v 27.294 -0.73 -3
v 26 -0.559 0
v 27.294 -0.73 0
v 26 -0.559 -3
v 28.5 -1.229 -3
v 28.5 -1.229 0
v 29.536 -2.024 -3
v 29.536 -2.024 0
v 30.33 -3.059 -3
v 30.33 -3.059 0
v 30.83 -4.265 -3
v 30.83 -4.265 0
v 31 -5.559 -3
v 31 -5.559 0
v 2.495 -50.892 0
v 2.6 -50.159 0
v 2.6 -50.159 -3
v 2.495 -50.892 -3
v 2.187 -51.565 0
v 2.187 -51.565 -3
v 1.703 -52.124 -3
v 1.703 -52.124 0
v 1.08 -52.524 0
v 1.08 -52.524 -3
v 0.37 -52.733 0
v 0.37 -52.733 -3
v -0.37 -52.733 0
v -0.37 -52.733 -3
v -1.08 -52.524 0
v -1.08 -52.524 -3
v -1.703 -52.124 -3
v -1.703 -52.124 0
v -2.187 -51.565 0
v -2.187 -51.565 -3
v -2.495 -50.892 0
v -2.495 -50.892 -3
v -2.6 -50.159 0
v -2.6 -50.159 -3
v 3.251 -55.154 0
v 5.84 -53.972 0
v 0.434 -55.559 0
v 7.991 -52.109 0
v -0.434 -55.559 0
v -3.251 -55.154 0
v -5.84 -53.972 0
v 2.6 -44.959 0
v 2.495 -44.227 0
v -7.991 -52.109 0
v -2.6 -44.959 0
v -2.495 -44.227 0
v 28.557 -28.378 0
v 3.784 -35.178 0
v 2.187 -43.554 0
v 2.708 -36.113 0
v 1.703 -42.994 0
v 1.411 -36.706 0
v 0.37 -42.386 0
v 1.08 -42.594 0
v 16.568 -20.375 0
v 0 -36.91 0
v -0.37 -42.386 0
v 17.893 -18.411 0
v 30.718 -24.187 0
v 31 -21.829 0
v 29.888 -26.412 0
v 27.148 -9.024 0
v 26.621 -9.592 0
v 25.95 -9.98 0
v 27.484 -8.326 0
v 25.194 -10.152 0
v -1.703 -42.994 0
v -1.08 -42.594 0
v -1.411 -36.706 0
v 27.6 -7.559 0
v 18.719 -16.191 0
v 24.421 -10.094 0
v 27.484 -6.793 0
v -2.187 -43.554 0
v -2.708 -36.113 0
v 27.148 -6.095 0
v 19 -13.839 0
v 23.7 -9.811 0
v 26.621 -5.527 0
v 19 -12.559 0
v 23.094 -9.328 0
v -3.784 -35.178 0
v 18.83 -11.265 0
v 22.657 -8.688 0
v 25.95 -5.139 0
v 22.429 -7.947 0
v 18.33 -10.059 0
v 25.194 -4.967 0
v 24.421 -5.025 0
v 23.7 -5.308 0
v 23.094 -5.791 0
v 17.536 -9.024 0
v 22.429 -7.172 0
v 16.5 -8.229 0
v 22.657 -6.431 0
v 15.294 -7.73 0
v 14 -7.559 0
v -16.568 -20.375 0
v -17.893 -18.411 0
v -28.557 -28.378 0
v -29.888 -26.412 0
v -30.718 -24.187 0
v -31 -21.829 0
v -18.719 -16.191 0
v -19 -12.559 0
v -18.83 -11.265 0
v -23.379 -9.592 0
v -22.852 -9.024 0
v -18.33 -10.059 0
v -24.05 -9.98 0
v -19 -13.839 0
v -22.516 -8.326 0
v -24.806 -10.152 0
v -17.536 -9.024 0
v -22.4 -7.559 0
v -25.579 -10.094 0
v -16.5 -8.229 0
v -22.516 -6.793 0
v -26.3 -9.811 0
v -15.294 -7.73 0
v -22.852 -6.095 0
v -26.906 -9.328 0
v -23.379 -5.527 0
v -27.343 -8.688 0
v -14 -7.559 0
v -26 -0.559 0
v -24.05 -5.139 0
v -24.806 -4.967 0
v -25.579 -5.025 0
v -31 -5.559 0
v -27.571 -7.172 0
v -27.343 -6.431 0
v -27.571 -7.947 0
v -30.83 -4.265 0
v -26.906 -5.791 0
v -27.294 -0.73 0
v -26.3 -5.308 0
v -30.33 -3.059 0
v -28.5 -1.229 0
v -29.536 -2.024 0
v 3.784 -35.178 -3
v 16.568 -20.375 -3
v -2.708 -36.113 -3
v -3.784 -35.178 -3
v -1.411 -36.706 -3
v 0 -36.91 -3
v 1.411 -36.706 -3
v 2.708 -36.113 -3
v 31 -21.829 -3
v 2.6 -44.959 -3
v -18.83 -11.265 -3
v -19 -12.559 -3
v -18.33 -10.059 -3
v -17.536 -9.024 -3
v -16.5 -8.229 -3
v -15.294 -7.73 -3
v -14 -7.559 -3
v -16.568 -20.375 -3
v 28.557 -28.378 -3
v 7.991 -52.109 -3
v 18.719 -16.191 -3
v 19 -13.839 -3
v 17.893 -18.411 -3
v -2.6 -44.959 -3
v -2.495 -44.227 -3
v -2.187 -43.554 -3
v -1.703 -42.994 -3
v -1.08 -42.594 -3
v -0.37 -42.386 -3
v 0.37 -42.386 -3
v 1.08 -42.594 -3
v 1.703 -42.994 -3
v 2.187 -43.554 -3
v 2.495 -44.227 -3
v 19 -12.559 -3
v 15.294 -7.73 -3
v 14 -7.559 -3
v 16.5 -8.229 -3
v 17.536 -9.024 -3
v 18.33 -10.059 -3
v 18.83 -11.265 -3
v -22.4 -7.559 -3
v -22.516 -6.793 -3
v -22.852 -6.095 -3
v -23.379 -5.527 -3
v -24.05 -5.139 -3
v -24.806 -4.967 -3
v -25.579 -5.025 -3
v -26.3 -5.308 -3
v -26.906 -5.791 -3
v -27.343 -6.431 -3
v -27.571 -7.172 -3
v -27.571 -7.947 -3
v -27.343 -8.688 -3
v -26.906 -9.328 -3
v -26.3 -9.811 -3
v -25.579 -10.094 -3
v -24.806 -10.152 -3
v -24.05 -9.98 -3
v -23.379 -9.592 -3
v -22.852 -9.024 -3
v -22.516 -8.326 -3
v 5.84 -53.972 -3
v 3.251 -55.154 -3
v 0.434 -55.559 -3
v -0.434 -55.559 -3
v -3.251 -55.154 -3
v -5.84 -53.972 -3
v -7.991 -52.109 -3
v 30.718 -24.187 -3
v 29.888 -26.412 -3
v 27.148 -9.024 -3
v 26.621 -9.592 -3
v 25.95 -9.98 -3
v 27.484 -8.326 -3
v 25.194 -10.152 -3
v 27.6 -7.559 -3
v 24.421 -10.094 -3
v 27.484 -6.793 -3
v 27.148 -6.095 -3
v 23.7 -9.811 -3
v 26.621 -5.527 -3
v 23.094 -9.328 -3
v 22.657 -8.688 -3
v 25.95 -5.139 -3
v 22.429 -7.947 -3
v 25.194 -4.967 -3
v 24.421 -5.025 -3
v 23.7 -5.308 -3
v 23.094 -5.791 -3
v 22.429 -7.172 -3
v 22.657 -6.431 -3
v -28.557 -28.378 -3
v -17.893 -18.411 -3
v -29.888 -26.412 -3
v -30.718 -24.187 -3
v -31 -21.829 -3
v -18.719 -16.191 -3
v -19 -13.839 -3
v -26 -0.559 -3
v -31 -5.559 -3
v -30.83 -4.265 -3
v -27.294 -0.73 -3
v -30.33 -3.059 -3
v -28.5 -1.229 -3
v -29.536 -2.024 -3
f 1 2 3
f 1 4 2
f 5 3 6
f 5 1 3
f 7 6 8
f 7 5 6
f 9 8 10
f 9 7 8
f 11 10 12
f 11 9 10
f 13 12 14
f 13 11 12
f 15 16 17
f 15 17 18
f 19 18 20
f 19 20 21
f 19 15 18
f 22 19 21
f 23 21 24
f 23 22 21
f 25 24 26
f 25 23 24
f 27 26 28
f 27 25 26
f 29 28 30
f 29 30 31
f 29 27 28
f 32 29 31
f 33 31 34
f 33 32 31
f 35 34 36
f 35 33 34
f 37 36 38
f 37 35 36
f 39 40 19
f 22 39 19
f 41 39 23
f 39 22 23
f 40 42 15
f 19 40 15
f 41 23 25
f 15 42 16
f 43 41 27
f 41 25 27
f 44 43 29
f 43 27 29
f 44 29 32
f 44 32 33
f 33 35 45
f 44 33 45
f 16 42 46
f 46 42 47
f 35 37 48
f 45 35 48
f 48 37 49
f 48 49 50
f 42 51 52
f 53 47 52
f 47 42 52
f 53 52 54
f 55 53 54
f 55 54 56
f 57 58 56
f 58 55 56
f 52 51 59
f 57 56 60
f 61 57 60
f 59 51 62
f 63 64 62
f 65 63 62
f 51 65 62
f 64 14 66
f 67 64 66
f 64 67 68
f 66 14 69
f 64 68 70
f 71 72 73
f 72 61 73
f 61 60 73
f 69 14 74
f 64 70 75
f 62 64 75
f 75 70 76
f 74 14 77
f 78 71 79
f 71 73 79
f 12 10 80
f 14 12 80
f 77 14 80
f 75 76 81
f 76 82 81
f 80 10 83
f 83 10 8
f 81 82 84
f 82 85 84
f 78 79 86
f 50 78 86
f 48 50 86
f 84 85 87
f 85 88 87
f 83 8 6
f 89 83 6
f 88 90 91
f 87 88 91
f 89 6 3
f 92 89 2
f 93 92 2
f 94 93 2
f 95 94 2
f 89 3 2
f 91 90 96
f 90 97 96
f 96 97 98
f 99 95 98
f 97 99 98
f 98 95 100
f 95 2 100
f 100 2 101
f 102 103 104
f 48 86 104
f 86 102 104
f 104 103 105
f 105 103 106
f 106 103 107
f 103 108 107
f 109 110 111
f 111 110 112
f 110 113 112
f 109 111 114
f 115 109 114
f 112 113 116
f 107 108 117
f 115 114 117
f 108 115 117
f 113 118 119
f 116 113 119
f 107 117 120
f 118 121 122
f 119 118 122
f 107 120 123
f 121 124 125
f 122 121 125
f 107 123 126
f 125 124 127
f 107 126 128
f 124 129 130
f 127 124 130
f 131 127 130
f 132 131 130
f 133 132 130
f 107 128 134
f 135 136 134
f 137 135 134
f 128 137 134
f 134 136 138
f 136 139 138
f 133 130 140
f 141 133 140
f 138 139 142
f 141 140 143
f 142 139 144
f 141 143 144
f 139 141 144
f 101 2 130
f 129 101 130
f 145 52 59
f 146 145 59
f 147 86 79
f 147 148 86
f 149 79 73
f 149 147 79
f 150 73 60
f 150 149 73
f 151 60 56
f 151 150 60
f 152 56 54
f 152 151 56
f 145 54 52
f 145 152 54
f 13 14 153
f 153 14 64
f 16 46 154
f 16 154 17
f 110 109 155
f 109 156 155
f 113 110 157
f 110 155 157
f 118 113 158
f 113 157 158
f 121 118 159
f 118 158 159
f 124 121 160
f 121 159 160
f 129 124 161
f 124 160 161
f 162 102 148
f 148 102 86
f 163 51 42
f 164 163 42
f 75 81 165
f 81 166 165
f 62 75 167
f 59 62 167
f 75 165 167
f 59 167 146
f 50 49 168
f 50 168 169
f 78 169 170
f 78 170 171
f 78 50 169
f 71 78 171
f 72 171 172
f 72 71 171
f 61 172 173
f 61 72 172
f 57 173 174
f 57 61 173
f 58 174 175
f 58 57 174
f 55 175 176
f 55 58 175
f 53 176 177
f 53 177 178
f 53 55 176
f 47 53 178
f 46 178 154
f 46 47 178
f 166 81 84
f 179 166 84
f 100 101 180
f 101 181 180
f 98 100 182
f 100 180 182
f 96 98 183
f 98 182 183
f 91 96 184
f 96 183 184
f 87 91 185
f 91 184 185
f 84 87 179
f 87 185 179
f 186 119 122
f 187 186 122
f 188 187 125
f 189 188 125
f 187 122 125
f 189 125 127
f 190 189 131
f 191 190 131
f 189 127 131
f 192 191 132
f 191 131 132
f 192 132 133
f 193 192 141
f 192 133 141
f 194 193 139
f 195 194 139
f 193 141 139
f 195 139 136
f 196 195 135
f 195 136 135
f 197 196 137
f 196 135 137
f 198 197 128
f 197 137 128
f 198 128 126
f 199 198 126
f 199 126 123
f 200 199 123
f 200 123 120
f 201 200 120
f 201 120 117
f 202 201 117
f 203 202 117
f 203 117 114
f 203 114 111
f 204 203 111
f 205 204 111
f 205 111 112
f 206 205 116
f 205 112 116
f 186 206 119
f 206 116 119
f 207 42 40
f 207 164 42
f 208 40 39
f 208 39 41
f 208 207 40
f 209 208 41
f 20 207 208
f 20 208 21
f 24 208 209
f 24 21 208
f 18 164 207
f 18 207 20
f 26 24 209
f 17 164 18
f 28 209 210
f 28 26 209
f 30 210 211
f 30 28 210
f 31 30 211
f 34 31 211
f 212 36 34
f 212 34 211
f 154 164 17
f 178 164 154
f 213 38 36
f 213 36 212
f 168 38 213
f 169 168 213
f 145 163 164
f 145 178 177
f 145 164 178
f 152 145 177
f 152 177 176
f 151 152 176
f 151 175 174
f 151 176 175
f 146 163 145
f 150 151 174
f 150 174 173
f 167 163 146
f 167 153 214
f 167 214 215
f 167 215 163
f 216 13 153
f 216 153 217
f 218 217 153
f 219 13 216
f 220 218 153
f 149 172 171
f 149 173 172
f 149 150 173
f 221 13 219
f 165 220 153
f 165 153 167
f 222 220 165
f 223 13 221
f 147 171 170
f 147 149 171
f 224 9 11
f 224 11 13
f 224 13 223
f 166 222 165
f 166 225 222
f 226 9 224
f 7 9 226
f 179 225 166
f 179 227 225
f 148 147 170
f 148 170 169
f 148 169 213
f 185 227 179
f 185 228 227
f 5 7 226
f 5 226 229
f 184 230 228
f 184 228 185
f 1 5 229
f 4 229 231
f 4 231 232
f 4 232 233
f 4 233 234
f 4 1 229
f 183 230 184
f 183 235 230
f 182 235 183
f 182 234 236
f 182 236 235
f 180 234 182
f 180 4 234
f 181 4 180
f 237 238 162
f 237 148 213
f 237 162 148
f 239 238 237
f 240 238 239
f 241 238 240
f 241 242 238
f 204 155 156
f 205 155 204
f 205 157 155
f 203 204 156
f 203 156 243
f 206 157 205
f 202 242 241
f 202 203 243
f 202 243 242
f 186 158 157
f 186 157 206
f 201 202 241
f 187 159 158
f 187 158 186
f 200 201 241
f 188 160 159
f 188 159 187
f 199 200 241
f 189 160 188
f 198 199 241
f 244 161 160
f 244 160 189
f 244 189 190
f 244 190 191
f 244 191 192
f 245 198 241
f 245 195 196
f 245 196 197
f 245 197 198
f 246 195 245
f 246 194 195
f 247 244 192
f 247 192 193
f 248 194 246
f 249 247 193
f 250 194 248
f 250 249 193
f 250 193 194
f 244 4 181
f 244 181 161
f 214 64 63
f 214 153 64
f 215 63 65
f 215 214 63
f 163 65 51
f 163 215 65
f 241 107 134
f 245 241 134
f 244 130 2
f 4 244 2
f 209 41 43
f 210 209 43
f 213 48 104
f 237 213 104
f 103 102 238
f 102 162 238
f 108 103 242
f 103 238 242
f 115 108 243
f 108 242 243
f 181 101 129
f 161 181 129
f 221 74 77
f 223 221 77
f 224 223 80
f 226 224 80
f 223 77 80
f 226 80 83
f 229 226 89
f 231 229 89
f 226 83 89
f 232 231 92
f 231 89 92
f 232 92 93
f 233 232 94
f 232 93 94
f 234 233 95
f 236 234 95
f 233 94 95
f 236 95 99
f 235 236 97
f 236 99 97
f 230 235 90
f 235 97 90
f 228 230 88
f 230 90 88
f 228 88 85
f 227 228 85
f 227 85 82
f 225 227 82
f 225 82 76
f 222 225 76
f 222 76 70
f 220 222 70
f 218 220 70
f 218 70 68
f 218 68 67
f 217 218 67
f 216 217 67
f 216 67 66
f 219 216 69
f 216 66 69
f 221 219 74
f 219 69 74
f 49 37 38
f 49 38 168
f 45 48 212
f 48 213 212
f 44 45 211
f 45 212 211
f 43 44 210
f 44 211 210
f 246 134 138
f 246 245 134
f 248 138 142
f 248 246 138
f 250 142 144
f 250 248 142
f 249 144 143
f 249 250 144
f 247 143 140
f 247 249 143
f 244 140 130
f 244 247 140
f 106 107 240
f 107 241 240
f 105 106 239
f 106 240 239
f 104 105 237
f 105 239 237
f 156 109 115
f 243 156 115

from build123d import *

# Parameters (mm, degrees)
SKETCH1_R          = 2.6
BASE_FLANGE1_DEPTH = 3
FILLET_10_MM_R     = 10
FILLET_5_MM_R      = 5


# Sheet-metal steps are written as plain solids
with BuildPart() as part:
    # Sketch1 → Base-Flange1 (new body)
    with BuildSketch(Plane.XY):
        Polygon((-31, -0.559405941), (31, -0.559405941), (31, -25.559405941), (5, -55.559405941), (-5, -55.559405941), (-31, -25.559405941), align=None)
        with Locations((25, -7.559405941)):
            Circle(SKETCH1_R, mode=Mode.SUBTRACT)
        with Locations((-25, -7.559405941)):
            Circle(SKETCH1_R, mode=Mode.SUBTRACT)
        with BuildLine():
            Line((-2.6, -50.159405941), (-2.6, -44.959405941))
            ThreePointArc((-2.6, -44.959405941), (0, -42.359405941), (2.6, -44.959405941))
            Line((2.6, -44.959405941), (2.6, -50.159405941))
            ThreePointArc((2.6, -50.159405941), (0, -52.759405941), (-2.6, -50.159405941))
        make_face(mode=Mode.SUBTRACT)
        Polygon((0, -39.559405941), (19, -17.559405941), (19, -7.559405941), (-19, -7.559405941), (-19, -17.559405941), align=None, mode=Mode.SUBTRACT)
    extrude(amount=-BASE_FLANGE1_DEPTH)

    # fillet 10 mm
    fillet_10_mm_edges = [part.edges().sort_by_distance(p)[0] for p in [
        (31, -25.559405941, -1.5),
        (5, -55.559405941, -1.5),
        (-5, -55.559405941, -1.5),
        (-31, -25.559405941, -1.5),
        (-19, -17.559405941, -1.5),
        (19, -17.559405941, -1.5),
    ]]
    fillet(fillet_10_mm_edges, radius=FILLET_10_MM_R)

    # fillet 5 mm
    fillet_5_mm_edges = [part.edges().sort_by_distance(p)[0] for p in [
        (-31, -0.559405941, -1.5),
        (31, -0.559405941, -1.5),
        (0, -39.559405941, -1.5),
        (-19, -7.559405941, -1.5),
        (19, -7.559405941, -1.5),
    ]]
    fillet(fillet_5_mm_edges, radius=FILLET_5_MM_R)


solid = part.part
